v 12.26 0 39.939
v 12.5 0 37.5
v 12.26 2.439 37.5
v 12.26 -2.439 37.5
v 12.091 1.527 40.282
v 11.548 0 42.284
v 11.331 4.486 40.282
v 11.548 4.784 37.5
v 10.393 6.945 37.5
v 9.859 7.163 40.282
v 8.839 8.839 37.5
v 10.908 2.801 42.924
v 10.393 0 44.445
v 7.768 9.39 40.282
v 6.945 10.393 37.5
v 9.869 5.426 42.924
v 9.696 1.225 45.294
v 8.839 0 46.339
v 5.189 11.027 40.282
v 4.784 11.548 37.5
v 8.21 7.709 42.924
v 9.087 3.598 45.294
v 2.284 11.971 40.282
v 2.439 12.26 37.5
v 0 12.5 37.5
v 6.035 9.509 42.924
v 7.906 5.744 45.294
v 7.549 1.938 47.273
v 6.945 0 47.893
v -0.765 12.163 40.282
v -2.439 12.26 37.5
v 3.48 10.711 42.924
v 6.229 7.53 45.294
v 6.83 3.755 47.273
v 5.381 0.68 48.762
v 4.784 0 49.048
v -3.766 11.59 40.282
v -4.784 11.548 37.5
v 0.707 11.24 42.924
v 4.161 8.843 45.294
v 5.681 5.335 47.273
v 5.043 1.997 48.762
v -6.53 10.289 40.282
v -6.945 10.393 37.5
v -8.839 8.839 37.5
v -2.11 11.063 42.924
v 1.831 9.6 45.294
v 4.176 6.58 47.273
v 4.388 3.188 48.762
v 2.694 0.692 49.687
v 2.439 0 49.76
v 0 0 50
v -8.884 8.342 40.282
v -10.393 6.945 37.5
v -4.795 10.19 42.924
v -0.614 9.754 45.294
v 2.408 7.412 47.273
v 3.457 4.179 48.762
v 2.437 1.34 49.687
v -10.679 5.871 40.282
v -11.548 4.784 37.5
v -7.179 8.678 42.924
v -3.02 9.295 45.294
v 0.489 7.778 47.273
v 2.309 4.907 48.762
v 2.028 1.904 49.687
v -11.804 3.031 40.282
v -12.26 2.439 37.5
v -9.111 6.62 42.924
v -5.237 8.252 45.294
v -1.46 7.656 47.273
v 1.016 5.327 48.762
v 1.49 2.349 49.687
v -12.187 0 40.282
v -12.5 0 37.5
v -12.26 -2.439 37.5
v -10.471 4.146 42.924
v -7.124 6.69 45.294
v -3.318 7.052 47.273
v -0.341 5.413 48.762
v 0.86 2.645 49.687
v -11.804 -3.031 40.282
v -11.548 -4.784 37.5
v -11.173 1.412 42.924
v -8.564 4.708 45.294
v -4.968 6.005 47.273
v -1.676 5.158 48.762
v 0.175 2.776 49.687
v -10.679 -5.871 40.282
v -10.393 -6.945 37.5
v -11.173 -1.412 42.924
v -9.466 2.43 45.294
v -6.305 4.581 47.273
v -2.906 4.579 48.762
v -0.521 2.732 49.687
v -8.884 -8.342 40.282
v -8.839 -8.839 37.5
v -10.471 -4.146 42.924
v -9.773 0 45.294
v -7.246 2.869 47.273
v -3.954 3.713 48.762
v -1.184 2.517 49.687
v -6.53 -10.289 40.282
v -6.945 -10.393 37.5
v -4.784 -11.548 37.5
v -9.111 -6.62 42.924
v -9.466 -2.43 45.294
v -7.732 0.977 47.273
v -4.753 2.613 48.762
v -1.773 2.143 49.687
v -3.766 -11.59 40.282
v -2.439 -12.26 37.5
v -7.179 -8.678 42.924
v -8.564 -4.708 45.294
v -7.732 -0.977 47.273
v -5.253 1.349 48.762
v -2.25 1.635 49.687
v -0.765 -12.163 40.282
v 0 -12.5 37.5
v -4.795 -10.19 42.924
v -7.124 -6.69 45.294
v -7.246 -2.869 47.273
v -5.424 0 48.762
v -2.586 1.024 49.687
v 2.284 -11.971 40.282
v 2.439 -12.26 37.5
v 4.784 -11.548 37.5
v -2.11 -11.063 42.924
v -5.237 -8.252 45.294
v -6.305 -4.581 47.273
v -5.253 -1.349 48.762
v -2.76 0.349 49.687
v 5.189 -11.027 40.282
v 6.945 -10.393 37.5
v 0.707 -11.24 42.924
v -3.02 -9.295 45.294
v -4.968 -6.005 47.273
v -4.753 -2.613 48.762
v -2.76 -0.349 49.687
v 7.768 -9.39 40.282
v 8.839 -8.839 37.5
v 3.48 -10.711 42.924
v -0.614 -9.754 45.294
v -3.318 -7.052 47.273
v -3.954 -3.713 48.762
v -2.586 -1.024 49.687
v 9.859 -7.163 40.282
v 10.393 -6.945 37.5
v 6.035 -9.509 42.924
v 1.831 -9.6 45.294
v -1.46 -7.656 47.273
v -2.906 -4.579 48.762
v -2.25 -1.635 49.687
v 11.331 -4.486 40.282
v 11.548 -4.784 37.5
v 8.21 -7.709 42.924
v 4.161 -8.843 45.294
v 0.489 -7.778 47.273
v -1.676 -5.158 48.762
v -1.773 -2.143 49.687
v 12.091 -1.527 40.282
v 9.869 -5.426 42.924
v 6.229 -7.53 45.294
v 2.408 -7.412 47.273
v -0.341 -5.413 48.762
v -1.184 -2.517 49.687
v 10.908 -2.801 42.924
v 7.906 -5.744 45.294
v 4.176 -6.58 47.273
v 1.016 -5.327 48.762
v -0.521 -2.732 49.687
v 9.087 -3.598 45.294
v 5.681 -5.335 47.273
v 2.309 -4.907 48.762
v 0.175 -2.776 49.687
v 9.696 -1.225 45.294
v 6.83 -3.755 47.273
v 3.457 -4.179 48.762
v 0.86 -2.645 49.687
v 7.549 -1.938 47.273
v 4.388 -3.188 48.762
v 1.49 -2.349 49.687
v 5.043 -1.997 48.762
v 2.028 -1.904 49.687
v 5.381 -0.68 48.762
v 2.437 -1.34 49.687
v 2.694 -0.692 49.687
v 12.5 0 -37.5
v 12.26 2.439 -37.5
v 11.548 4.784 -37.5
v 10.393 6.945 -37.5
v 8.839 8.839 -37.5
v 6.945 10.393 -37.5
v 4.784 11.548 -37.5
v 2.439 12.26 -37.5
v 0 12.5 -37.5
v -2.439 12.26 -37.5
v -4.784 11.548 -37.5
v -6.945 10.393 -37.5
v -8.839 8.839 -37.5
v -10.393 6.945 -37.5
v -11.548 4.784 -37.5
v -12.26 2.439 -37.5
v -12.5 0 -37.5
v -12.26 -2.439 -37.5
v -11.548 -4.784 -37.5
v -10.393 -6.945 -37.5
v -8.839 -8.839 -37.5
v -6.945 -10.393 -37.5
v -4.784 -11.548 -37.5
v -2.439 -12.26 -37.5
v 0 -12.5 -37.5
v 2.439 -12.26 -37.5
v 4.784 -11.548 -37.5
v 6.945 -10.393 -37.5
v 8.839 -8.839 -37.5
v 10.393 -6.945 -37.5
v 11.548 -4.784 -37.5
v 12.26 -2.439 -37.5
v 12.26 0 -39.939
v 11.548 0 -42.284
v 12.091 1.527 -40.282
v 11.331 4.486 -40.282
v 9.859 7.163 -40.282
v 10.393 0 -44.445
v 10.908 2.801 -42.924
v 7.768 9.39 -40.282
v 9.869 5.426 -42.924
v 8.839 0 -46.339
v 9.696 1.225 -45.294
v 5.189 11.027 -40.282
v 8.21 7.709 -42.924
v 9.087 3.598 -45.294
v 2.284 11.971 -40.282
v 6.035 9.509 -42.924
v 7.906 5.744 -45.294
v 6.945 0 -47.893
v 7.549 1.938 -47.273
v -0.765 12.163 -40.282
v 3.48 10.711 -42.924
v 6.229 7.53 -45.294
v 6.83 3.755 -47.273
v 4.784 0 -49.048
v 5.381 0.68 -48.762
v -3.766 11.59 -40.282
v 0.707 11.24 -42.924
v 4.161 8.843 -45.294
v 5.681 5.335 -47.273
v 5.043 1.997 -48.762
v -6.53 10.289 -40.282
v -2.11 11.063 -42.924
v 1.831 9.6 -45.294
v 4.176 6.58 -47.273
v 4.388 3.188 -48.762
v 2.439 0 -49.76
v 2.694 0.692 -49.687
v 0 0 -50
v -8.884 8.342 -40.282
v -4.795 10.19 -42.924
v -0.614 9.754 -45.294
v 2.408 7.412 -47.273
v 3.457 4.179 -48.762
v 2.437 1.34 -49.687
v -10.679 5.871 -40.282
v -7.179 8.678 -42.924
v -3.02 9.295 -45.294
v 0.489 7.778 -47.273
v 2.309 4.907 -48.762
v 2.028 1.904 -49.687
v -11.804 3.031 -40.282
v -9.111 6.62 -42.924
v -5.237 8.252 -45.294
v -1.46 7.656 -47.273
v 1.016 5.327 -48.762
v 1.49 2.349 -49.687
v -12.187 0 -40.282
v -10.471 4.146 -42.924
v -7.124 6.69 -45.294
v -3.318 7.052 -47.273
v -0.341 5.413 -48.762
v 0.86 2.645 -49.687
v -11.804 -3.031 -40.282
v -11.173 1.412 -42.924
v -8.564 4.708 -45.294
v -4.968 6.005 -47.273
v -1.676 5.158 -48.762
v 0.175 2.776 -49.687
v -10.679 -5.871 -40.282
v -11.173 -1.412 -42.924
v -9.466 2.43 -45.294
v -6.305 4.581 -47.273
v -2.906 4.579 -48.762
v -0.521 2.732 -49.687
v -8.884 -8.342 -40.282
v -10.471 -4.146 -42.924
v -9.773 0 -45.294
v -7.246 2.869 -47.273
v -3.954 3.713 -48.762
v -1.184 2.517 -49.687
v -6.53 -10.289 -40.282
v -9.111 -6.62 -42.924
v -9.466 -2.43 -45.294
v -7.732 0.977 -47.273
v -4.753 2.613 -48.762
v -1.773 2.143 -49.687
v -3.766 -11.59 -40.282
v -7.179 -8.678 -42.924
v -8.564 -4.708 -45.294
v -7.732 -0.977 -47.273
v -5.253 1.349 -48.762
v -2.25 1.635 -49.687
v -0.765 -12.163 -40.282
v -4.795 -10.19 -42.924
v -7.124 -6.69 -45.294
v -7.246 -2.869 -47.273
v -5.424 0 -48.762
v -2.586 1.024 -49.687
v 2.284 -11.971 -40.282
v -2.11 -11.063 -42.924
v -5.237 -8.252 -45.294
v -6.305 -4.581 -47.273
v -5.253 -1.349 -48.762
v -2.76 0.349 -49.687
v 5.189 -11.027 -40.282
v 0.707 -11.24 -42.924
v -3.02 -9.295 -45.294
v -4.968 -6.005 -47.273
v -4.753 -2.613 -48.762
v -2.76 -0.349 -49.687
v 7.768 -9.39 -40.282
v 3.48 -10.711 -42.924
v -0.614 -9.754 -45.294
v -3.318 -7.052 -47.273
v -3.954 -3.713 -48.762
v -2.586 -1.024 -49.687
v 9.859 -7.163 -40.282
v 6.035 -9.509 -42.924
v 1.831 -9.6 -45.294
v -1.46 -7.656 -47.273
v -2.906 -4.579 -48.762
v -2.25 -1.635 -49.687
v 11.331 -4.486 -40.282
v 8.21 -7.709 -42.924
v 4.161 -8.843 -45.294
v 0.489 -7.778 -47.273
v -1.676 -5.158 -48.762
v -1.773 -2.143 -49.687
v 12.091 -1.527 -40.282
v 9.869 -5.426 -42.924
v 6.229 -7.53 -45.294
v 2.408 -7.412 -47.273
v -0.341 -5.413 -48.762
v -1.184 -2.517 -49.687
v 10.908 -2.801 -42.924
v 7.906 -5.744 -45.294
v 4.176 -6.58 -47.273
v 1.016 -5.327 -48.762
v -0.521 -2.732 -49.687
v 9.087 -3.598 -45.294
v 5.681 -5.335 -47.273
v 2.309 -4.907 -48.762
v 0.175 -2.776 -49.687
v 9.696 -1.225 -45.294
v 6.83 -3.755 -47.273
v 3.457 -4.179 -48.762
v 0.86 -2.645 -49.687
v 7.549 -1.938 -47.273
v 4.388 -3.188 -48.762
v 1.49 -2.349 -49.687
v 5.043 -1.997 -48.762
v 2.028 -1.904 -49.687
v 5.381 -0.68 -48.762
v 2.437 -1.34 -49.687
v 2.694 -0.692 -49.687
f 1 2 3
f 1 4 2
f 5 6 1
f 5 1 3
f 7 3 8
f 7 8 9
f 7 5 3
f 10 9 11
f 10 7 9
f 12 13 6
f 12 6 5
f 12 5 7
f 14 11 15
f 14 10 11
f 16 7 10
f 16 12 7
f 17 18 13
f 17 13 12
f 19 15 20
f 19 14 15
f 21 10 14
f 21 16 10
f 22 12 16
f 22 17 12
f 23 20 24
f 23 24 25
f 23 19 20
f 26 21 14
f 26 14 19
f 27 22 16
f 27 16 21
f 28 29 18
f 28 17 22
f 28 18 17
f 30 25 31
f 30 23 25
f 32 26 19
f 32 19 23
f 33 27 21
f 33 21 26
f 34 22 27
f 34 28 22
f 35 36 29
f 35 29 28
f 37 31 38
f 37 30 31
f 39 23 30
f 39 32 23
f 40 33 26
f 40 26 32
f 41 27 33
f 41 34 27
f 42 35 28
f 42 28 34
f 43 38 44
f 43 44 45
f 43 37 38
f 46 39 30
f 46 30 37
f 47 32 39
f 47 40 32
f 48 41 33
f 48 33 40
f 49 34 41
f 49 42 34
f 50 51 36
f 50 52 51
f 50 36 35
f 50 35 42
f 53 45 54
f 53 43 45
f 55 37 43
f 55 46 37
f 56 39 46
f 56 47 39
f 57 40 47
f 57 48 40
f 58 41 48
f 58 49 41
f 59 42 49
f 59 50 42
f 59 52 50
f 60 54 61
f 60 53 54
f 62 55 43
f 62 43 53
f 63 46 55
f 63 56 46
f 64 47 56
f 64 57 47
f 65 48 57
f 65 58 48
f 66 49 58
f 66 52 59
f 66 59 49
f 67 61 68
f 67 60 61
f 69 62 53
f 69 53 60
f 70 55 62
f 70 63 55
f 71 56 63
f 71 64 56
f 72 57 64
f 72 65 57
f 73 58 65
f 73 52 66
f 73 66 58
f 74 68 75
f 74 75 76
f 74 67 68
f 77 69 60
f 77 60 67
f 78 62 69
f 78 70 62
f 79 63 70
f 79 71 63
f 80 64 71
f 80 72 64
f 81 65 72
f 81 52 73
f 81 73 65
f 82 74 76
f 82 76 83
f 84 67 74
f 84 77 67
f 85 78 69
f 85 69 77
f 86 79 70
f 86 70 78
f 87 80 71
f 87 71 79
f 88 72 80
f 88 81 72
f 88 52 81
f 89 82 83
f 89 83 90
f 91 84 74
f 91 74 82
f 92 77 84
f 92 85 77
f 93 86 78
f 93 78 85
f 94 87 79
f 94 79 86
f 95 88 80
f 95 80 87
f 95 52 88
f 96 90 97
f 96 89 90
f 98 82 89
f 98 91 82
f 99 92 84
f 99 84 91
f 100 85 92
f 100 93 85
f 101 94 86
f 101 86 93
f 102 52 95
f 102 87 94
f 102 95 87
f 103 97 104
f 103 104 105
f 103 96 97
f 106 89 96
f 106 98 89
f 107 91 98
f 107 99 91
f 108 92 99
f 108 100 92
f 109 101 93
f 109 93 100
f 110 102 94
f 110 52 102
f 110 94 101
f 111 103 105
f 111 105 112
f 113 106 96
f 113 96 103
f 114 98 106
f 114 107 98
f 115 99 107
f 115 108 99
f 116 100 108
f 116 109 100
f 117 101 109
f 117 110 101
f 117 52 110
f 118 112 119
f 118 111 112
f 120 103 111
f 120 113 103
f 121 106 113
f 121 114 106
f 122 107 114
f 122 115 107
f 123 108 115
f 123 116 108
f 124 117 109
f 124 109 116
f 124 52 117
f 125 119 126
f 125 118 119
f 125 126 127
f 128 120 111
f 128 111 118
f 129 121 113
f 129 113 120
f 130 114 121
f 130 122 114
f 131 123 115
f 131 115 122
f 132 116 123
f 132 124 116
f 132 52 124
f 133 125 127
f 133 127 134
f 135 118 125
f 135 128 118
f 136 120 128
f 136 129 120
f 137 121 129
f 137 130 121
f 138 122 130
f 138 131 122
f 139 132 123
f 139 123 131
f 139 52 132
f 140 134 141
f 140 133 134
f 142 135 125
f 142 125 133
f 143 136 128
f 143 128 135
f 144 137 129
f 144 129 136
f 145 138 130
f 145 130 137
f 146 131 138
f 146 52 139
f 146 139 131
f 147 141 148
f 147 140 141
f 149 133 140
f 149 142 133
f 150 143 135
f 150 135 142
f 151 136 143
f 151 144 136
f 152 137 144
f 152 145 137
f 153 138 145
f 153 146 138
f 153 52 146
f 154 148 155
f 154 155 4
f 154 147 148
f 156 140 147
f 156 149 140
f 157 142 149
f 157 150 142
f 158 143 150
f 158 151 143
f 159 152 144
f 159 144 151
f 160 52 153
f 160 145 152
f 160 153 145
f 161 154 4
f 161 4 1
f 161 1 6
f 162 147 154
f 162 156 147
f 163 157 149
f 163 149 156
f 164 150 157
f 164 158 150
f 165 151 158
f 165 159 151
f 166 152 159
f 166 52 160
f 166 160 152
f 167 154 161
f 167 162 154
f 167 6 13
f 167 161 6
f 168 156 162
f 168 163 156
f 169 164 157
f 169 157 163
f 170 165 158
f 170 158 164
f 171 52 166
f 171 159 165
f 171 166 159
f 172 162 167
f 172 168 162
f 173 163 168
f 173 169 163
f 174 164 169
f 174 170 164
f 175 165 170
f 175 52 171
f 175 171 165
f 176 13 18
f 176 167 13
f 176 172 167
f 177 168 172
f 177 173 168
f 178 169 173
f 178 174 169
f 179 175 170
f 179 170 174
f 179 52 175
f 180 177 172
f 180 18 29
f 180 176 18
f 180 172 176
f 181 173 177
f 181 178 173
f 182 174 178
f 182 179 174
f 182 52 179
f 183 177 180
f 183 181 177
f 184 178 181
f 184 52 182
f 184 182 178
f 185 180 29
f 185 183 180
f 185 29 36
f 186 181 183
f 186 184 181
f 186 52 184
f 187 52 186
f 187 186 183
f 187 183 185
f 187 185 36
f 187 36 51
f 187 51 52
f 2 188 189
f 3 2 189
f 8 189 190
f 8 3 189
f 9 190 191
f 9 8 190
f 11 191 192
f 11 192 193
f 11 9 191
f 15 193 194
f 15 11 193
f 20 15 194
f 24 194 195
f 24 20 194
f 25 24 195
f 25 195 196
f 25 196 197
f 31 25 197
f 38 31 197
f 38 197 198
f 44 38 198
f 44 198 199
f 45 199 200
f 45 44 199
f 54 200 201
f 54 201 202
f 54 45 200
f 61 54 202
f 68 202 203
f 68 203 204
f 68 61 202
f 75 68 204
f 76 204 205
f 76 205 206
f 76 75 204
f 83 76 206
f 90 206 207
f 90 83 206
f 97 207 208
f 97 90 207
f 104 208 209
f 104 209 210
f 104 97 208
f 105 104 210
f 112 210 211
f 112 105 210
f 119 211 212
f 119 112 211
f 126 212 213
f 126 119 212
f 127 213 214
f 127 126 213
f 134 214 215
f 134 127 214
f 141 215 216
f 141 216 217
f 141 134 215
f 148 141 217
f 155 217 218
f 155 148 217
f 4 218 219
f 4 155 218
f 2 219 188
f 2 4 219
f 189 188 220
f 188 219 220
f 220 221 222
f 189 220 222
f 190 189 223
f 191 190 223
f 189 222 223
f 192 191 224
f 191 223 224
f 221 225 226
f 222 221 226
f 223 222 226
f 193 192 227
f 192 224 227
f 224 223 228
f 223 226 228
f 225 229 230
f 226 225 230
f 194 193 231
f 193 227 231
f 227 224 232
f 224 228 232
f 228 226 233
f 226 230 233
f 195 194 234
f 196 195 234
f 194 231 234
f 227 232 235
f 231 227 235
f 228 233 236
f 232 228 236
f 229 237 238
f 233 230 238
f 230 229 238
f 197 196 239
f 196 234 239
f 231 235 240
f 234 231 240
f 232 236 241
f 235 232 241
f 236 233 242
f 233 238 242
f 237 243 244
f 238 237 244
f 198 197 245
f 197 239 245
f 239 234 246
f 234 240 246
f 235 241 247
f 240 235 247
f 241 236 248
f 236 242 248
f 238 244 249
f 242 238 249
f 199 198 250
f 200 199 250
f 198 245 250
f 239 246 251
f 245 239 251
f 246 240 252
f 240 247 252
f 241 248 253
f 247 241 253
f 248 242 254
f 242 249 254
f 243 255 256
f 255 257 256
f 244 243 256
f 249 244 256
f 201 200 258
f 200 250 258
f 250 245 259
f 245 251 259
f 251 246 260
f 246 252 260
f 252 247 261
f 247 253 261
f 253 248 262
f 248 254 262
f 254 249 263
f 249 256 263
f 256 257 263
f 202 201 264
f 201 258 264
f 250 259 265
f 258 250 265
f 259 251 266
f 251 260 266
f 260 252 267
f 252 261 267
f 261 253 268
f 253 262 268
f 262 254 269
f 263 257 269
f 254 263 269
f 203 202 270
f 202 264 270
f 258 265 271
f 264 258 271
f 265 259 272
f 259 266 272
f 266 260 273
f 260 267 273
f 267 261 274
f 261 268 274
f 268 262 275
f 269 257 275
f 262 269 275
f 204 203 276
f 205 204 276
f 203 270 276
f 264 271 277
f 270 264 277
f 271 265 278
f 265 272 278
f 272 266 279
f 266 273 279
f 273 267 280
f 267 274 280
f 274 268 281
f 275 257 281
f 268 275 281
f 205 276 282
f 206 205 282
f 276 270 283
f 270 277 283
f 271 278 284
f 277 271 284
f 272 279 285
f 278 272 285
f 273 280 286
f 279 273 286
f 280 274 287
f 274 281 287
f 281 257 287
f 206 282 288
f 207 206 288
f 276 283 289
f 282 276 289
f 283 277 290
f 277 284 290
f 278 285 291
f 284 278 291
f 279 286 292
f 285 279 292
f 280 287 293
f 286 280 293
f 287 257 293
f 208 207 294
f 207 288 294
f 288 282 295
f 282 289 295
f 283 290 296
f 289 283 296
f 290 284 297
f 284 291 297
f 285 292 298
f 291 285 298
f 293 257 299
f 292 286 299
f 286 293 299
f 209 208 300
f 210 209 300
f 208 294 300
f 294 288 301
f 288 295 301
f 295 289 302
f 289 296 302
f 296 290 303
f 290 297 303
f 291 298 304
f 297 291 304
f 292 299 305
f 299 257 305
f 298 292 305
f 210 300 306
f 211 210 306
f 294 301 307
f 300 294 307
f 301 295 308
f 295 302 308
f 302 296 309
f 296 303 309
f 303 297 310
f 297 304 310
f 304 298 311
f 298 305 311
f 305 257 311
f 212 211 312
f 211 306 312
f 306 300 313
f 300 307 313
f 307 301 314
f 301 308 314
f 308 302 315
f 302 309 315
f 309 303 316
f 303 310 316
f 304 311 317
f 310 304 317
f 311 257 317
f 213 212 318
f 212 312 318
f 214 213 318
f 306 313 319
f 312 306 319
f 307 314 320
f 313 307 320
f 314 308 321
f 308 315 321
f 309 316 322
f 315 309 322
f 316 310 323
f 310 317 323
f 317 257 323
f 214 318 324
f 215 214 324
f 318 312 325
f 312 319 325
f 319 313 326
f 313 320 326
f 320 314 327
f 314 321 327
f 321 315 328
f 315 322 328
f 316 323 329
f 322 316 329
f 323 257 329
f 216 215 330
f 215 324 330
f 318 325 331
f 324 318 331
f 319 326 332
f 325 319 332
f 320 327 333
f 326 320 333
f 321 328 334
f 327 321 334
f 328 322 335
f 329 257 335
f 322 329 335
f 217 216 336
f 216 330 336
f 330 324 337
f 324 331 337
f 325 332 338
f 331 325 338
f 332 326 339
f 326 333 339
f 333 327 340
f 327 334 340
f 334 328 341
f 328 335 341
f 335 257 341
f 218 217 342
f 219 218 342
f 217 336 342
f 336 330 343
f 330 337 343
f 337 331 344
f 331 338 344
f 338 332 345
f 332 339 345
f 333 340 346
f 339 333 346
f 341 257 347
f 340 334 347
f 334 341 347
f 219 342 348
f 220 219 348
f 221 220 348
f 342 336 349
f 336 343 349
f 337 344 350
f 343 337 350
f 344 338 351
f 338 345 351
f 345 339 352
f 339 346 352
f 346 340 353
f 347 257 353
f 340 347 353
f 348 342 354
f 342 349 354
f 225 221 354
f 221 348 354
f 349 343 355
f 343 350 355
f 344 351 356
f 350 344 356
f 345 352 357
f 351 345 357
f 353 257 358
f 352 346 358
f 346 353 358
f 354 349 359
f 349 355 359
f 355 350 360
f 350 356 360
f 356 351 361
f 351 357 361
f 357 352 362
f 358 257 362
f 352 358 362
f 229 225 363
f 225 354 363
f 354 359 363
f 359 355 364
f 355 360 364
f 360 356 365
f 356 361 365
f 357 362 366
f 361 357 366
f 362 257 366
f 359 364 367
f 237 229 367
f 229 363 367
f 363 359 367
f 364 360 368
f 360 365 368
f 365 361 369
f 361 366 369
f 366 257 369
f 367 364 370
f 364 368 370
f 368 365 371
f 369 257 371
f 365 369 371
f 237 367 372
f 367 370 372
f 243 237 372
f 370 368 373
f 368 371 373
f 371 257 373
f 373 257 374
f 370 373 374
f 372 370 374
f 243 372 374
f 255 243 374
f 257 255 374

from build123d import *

# Parameters (mm, degrees)
F0_R     = 12.5
F1_DEPTH = 50
F2_R     = 12.5


with BuildPart() as f1:
    # F0 (on Top) → F1 (new body)
    with BuildSketch(Plane.XY):
        Circle(F0_R)
    extrude(amount=F1_DEPTH)

    # F2
    f2_edges = [f1.edges().sort_by_distance(p)[0] for p in [
        (-12.5, 0, 50),
    ]]
    fillet(f2_edges, radius=F2_R)

    # F3: F1 across plane


with BuildPart() as f1_1:
    add(f1.part)
    add(f1.part.mirror(Plane.XY))


solid = f1_1.part
